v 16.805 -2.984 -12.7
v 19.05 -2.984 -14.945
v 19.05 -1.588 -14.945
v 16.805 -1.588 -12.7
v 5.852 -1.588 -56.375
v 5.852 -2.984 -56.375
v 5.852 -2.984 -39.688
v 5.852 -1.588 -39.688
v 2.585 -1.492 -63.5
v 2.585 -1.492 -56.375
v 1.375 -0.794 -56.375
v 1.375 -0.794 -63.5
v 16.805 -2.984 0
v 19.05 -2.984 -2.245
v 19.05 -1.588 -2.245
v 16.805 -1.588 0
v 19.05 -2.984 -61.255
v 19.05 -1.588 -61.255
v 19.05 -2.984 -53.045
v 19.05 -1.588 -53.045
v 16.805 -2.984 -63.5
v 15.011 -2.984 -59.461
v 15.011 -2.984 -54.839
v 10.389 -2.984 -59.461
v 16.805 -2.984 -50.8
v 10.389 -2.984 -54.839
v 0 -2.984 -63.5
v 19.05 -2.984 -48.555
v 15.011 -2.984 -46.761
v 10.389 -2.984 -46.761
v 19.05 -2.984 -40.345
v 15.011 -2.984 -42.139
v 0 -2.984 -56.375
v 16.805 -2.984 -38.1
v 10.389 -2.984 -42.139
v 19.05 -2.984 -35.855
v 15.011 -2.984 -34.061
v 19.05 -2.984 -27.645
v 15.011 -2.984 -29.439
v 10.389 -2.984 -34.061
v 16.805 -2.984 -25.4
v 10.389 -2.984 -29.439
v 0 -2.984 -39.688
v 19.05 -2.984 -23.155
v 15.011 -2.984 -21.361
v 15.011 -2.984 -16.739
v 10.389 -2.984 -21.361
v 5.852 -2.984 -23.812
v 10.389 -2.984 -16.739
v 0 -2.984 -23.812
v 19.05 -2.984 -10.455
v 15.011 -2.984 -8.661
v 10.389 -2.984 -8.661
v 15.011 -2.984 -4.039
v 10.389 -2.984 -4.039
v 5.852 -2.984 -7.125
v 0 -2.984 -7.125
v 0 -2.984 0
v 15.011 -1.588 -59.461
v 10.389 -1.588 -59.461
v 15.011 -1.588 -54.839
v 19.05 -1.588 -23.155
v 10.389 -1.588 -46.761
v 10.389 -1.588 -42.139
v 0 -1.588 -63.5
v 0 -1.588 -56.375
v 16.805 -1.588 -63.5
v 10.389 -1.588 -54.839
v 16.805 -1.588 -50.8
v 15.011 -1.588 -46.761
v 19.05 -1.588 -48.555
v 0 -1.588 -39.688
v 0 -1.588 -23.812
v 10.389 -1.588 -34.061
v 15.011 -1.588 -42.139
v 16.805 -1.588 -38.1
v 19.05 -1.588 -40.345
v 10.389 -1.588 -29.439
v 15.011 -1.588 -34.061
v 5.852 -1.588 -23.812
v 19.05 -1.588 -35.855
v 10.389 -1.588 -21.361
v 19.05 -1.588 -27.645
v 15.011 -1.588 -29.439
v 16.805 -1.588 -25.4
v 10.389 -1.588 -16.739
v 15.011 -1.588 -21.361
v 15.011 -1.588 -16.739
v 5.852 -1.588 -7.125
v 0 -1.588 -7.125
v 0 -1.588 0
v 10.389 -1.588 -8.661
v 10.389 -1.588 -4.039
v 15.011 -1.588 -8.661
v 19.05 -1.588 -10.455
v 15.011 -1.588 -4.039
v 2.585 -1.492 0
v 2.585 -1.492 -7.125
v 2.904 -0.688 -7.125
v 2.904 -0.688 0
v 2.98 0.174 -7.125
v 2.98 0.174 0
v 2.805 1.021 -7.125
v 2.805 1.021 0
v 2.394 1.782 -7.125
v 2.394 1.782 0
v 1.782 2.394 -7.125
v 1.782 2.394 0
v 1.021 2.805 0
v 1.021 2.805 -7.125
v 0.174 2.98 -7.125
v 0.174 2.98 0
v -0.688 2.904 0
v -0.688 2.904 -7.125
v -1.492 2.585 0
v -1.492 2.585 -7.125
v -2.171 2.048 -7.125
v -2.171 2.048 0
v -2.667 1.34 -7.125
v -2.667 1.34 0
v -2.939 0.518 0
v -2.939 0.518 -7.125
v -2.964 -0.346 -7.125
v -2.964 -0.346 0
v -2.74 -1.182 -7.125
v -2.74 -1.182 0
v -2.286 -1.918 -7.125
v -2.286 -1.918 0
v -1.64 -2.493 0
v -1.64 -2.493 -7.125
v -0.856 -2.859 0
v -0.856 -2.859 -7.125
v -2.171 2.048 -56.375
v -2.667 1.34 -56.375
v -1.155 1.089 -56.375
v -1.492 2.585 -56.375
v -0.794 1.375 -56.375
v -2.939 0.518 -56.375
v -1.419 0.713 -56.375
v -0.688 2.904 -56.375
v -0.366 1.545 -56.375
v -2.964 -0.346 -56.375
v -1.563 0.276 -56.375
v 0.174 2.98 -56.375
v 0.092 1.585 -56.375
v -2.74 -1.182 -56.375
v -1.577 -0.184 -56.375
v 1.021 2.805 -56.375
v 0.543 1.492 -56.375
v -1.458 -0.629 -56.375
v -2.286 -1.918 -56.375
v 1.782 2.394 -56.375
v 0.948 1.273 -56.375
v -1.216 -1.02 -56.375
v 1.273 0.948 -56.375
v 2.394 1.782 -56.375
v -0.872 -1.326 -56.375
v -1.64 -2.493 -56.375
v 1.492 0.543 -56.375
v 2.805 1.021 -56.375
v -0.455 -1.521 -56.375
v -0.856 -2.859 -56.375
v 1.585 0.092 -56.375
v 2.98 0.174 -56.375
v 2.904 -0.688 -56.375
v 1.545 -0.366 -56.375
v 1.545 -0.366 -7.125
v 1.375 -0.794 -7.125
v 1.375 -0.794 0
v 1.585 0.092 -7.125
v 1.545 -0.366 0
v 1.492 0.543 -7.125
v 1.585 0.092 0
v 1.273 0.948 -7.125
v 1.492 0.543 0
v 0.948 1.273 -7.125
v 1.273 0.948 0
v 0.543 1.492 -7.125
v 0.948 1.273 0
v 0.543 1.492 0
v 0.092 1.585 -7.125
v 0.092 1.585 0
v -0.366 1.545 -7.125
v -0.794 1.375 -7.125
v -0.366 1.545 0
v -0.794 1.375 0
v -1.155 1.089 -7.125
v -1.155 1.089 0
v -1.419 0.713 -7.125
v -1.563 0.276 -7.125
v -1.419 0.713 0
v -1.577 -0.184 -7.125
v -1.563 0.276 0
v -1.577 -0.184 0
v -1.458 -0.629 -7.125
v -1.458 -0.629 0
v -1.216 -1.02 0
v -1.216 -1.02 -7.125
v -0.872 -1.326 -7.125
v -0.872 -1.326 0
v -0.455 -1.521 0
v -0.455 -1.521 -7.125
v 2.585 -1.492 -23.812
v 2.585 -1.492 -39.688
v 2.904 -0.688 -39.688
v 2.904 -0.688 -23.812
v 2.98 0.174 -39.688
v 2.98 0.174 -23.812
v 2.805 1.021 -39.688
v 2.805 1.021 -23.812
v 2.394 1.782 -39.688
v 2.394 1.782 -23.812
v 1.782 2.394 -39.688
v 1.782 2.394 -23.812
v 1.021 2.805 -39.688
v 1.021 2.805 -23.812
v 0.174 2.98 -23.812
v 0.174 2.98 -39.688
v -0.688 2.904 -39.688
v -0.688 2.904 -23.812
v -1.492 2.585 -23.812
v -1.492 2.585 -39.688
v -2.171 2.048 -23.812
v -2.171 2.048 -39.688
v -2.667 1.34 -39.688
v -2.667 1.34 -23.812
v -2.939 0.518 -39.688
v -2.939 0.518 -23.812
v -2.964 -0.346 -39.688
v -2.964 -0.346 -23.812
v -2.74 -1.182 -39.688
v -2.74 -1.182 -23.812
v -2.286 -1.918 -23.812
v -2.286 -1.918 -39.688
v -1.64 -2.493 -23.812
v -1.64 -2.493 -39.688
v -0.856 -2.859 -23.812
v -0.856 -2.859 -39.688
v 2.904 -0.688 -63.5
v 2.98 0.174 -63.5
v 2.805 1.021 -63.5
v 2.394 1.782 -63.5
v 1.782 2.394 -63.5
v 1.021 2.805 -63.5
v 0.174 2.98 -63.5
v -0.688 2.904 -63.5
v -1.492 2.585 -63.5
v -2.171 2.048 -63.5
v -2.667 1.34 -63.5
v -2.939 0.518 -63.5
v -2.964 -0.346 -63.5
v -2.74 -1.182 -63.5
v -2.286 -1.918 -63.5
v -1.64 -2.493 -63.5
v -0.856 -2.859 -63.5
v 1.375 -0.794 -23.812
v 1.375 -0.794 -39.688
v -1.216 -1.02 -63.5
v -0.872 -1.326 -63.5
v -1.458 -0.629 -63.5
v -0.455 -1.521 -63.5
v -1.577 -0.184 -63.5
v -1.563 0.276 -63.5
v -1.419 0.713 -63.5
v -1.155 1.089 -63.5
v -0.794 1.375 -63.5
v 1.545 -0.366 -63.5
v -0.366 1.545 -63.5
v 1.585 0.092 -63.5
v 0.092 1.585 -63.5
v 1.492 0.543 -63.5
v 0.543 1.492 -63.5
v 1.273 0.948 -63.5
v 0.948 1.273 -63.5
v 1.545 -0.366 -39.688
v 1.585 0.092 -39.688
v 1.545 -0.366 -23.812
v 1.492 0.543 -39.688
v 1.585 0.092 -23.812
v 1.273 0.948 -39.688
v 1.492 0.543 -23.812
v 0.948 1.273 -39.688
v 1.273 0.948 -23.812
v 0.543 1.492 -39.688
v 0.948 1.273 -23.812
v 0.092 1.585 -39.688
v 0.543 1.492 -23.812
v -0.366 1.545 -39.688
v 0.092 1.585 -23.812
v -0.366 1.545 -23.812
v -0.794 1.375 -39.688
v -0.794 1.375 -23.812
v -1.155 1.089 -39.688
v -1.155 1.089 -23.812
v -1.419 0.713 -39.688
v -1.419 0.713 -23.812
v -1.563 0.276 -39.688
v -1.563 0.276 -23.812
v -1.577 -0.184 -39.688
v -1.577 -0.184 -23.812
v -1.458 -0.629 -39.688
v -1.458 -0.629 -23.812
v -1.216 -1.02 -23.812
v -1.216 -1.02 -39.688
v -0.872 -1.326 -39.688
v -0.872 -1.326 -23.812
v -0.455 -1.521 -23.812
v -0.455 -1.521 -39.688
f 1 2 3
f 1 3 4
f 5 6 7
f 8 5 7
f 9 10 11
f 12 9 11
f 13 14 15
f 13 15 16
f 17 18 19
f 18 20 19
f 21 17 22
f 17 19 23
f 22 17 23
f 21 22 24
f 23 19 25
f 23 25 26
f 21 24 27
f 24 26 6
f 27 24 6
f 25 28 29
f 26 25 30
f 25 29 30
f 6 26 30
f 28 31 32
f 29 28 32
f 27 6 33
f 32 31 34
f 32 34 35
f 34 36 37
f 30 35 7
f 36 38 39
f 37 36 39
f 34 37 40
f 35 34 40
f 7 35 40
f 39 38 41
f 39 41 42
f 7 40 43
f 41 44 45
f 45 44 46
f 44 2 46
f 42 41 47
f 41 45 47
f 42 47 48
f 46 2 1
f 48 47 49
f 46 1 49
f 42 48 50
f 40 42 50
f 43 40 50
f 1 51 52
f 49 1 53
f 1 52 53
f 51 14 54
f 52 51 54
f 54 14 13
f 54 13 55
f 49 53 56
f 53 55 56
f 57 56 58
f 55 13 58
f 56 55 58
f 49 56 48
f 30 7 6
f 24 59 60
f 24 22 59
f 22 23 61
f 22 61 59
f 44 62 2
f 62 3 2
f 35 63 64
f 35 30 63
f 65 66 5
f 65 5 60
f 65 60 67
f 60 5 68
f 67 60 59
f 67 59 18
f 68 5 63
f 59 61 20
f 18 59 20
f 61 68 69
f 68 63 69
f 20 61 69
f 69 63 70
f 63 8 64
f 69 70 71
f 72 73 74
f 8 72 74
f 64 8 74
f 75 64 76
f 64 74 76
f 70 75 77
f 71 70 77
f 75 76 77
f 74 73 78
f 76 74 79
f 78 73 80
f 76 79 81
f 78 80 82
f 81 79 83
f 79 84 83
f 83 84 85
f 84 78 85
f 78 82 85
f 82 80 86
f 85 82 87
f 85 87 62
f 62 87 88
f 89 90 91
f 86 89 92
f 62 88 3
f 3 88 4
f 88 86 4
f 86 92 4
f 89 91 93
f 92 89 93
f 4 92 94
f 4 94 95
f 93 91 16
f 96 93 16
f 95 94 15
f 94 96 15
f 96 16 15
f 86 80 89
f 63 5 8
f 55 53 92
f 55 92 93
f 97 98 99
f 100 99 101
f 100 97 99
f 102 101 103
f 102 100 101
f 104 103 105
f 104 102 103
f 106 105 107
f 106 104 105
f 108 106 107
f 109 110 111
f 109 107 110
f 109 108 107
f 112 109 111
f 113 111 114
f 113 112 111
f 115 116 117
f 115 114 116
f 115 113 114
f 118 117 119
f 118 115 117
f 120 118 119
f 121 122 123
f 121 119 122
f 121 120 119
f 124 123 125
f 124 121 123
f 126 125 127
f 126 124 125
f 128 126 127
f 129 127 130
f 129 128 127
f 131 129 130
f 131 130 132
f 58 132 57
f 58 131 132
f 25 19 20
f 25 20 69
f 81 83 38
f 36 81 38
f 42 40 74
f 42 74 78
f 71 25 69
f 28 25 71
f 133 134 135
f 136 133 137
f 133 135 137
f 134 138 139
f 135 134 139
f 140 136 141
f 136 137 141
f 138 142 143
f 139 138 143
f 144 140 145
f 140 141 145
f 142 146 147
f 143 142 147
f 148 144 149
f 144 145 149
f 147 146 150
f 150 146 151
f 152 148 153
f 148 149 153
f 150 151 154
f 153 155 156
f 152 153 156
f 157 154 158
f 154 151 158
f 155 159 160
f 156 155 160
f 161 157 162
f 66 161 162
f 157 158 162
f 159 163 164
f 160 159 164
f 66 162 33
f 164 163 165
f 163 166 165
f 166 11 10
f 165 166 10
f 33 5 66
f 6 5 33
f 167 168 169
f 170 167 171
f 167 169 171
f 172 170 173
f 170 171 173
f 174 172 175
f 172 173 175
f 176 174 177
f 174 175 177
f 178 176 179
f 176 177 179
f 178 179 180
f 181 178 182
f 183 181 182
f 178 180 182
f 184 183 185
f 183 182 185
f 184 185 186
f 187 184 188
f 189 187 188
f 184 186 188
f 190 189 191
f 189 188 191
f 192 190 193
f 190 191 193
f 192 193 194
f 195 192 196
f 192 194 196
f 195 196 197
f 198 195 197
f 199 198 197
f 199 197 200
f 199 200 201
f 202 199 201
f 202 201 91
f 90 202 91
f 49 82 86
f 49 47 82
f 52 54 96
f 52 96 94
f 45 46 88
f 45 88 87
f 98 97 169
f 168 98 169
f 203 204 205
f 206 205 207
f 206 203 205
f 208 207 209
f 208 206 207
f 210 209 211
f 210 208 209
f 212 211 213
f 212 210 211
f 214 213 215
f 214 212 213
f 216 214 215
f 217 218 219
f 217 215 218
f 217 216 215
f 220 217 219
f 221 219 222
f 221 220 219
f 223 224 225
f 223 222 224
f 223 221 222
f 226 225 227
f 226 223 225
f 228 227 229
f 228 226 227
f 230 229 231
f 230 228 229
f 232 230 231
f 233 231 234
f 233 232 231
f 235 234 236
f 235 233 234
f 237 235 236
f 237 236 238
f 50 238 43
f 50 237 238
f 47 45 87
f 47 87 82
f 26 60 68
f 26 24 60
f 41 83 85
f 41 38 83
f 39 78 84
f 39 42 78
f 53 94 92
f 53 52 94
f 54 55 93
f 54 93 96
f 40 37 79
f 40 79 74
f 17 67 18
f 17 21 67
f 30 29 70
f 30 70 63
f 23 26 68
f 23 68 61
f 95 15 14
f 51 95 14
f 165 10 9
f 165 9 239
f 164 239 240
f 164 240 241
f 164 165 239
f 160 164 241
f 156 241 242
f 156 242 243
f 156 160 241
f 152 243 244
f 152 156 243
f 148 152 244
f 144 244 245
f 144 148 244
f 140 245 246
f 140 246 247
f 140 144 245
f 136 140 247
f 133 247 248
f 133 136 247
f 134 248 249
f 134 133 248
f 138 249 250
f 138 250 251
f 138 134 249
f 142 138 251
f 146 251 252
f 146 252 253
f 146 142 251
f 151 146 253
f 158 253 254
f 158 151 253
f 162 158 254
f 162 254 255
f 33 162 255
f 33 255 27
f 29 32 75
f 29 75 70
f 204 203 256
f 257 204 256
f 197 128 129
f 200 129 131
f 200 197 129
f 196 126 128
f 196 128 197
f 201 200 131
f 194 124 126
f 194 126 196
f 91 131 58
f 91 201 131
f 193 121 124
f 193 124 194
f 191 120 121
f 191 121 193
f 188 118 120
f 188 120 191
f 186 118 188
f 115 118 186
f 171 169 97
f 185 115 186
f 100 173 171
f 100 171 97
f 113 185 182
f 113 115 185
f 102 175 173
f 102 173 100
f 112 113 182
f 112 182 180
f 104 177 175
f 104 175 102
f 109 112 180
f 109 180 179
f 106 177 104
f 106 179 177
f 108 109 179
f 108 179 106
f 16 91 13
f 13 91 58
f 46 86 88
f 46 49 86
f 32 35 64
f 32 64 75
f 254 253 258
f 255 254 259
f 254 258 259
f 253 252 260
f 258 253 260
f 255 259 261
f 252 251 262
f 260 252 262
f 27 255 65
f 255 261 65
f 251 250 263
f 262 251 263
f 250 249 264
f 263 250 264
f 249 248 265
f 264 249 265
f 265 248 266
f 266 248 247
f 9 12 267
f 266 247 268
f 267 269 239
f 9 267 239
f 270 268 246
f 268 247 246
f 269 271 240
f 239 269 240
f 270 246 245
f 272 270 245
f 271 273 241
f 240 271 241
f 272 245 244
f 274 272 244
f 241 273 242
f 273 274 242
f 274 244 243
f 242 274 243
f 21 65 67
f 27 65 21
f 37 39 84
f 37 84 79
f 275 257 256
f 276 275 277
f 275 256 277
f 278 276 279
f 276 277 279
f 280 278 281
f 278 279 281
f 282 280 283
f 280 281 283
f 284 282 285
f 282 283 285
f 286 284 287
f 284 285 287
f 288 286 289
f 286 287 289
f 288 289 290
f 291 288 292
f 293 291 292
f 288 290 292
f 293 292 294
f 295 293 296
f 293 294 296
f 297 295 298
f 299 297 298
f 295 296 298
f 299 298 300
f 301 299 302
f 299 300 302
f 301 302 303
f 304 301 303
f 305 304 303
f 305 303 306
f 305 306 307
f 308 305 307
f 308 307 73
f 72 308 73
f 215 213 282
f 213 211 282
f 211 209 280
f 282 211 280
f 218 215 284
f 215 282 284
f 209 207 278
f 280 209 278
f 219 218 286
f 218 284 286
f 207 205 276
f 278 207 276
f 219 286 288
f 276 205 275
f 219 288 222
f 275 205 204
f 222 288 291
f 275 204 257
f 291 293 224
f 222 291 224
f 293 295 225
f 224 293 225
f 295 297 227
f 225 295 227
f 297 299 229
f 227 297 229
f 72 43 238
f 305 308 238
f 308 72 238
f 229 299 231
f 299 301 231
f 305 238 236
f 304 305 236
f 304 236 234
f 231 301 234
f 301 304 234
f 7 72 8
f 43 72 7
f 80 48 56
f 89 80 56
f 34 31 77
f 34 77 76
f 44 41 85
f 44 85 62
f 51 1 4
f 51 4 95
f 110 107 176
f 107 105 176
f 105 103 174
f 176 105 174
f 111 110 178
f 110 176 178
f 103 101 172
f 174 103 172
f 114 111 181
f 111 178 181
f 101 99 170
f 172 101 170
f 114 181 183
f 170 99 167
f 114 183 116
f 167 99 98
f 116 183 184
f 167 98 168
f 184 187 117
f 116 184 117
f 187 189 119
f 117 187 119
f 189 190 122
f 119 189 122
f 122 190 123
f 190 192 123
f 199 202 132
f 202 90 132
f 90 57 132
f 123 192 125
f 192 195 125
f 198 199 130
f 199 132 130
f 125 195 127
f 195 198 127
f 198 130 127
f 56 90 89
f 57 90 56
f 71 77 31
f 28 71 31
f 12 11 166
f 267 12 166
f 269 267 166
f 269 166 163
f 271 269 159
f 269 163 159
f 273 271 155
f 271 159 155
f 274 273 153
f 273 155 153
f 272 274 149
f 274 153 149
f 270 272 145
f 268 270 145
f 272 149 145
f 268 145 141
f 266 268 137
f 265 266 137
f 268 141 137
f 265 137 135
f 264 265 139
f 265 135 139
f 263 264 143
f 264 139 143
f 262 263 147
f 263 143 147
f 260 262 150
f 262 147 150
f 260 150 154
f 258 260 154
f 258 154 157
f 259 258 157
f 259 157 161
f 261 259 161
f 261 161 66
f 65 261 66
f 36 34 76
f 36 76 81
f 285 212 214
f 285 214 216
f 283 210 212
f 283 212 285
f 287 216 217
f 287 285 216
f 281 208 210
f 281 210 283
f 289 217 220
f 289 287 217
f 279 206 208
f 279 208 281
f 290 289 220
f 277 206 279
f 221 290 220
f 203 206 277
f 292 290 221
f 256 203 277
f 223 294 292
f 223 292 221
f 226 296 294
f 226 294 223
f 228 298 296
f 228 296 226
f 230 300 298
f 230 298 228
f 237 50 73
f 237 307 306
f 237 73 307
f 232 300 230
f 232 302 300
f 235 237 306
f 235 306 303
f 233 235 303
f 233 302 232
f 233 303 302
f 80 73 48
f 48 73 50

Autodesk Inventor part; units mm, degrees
ref_plane "YZ Plane" through (0, 0, 0) normal (1, 0, 0) x (0, 1, 0)
ref_plane "XZ Plane" through (0, 0, 0) normal (0, 1, 0) x (-1, 0, 0)
ref_plane "XY Plane" through (0, 0, 0) normal (0, 0, 1) x (1, 0, 0)
sketch "Sketch1" plane through (0, 0, 0) normal (0, 0, 1) x (1, 0, 0)
  line L0 (2.5847, -1.4923) -> (1.3748, -0.7938)
  arc A0 (2.5847, -1.4923) -> (0, -2.9845) centre (0, 0) ccw
  arc A1 (1.3748, -0.7938) -> (0, -1.5875) centre (0, 0) ccw
  arc A2 (1.3748, -0.7938) -> (0, -1.5875) centre (0, 0) ccw
  line L1 (0, -1.5875) -> (16.8049, -1.5875)
  line L2 (16.8049, -2.9845) -> (0, -2.9845)
  arc A3 (2.5847, -1.4923) -> (0, -2.9845) centre (0, 0) ccw
  line L3 (2.5847, -1.4923) -> (1.3748, -0.7938)
  line L4 (19.05, -1.5875) -> (16.8049, -1.5875)
  line L5 (19.05, -2.9845) -> (16.8049, -2.9845)
  line L6 (19.05, -1.5875) -> (19.05, -2.9845)
  point P0 (0, 0)
  point P1 (15.875, -2.9845)
extrude "Extrusion1" add sketch "Sketch1" against normal blind 63.5
sketch "Sketch2" plane through (0, -2.9845, 0) normal (0, -1, 0) x (1, 0, 0)
  line L0 (19.05, -23.1549) -> (19.05, -14.9451)
  line L1 (19.05, -14.9451) -> (16.8049, -12.7)
  line L2 (16.8049, -12.7) -> (19.05, -10.4549)
  line L3 (19.05, -10.4549) -> (19.05, -2.2451)
  line L4 (19.05, -2.2451) -> (16.8049, 0)
  line L5 (0, 0) -> (16.8049, 0)
  line L6 (0, -7.1247) -> (0, 0)
  line L7 (5.8525, -7.1247) -> (-2.9845, -7.1247)
  line L8 (5.8525, -23.8125) -> (5.8525, -7.1247)
  line L9 (5.8525, -23.8125) -> (-2.9845, -23.8125)
  line L10 (0, -39.6875) -> (0, -23.8125)
  line L11 (5.8525, -39.6875) -> (-2.9845, -39.6875)
  line L12 (5.8525, -56.3753) -> (5.8525, -39.6875)
  line L13 (-2.9845, -56.3753) -> (5.8525, -56.3753)
  line L14 (0, -63.5) -> (0, -56.3753)
  line L15 (16.8049, -63.5) -> (0, -63.5)
  line L16 (16.8049, -63.5) -> (19.05, -61.2549)
  line L17 (19.05, -61.2549) -> (19.05, -53.0451)
  line L18 (19.05, -53.0451) -> (16.8049, -50.8)
  line L19 (16.8049, -50.8) -> (19.05, -48.5549)
  line L20 (19.05, -48.5549) -> (19.05, -40.3451)
  line L21 (19.05, -40.3451) -> (16.8049, -38.1)
  line L22 (16.8049, -38.1) -> (19.05, -35.8549)
  line L23 (19.05, -35.8549) -> (19.05, -27.6451)
  line L24 (19.05, -27.6451) -> (16.8049, -25.4)
  line L25 (16.8049, -25.4) -> (19.05, -23.1549)
  line L26 (15.0114, -42.1386) -> (15.0114, -46.7614)
  line L27 (15.0114, -46.7614) -> (10.3886, -46.7614)
  line L28 (10.3886, -46.7614) -> (10.3886, -42.1386)
  line L29 (10.3886, -42.1386) -> (15.0114, -42.1386)
  line L30 (15.0114, -29.4386) -> (15.0114, -34.0614)
  line L31 (15.0114, -34.0614) -> (10.3886, -34.0614)
  line L32 (10.3886, -34.0614) -> (10.3886, -29.4386)
  line L33 (10.3886, -29.4386) -> (15.0114, -29.4386)
  line L34 (15.0114, -16.7386) -> (15.0114, -21.3614)
  line L35 (15.0114, -21.3614) -> (10.3886, -21.3614)
  line L36 (10.3886, -21.3614) -> (10.3886, -16.7386)
  line L37 (10.3886, -16.7386) -> (15.0114, -16.7386)
  line L38 (15.0114, -4.0386) -> (15.0114, -8.6614)
  line L39 (15.0114, -8.6614) -> (10.3886, -8.6614)
  line L40 (10.3886, -8.6614) -> (10.3886, -4.0386)
  line L41 (10.3886, -4.0386) -> (15.0114, -4.0386)
  line L42 (15.0114, -54.8386) -> (15.0114, -59.4614)
  line L43 (15.0114, -59.4614) -> (10.3886, -59.4614)
  line L44 (10.3886, -59.4614) -> (10.3886, -54.8386)
  line L45 (10.3886, -54.8386) -> (15.0114, -54.8386)
  line L46 (-2.9845, 0) -> (-2.9845, -63.5) projected
  line L47 (19.05, -53.0451) -> (19.05, -48.5549)
  line L48 (19.05, -40.3451) -> (19.05, -35.8549)
  line L49 (19.05, -27.6451) -> (19.05, -23.1549)
  line L50 (19.05, -14.9451) -> (19.05, -10.4549)
  line L51 (0, 0) -> (16.8049, 0) projected
  line L52 (16.8049, -63.5) -> (19.05, -63.5)
  line L53 (19.05, -63.5) -> (19.05, -61.2549)
  line L54 (19.05, -2.2451) -> (19.05, 0)
  line L55 (19.05, 0) -> (16.8049, 0)
  line L56 (16.8049, -63.5) -> (19.05, -61.2549)
  line L57 (19.05, -2.2451) -> (16.8049, 0)
  point P0 (15.875, -31.75)
extrude "Extrusion2" cut sketch "Sketch2" against normal blind 6.35 contours L49 L24 L25 | L1 L2 L50 | L48 L21 L22 | L4 L55 L54 | L47 L18 L19 | L7 L8 L9 L46 | L53 L52 L16 | L11 L12 L13 L46 | L26 L27 L28 L29 | L30 L31 L32 L33 | L34 L35 L36 L37 | L38 L39 L40 L41 | L42 L43 L44 L45
sketch "Sketch3" plane through (0, -2.9845, 0) normal (0, -1, 0) x (1, 0, 0)
  line L0 (15.0114, -8.6614) -> (10.3886, -8.6614) projected
  circle A0 centre (12.7, -6.35) radius 2.3114
surface extrude "ExtrusionSrf1" sketch "Sketch3" against normal up to surface (1.397 mm away) shown no curves A0
pattern_linear "Rectangular Pattern1" count 5 spacing 12.7 along (0, 0, -1) of "ExtrusionSrf1"
properties part number "275-1272"
